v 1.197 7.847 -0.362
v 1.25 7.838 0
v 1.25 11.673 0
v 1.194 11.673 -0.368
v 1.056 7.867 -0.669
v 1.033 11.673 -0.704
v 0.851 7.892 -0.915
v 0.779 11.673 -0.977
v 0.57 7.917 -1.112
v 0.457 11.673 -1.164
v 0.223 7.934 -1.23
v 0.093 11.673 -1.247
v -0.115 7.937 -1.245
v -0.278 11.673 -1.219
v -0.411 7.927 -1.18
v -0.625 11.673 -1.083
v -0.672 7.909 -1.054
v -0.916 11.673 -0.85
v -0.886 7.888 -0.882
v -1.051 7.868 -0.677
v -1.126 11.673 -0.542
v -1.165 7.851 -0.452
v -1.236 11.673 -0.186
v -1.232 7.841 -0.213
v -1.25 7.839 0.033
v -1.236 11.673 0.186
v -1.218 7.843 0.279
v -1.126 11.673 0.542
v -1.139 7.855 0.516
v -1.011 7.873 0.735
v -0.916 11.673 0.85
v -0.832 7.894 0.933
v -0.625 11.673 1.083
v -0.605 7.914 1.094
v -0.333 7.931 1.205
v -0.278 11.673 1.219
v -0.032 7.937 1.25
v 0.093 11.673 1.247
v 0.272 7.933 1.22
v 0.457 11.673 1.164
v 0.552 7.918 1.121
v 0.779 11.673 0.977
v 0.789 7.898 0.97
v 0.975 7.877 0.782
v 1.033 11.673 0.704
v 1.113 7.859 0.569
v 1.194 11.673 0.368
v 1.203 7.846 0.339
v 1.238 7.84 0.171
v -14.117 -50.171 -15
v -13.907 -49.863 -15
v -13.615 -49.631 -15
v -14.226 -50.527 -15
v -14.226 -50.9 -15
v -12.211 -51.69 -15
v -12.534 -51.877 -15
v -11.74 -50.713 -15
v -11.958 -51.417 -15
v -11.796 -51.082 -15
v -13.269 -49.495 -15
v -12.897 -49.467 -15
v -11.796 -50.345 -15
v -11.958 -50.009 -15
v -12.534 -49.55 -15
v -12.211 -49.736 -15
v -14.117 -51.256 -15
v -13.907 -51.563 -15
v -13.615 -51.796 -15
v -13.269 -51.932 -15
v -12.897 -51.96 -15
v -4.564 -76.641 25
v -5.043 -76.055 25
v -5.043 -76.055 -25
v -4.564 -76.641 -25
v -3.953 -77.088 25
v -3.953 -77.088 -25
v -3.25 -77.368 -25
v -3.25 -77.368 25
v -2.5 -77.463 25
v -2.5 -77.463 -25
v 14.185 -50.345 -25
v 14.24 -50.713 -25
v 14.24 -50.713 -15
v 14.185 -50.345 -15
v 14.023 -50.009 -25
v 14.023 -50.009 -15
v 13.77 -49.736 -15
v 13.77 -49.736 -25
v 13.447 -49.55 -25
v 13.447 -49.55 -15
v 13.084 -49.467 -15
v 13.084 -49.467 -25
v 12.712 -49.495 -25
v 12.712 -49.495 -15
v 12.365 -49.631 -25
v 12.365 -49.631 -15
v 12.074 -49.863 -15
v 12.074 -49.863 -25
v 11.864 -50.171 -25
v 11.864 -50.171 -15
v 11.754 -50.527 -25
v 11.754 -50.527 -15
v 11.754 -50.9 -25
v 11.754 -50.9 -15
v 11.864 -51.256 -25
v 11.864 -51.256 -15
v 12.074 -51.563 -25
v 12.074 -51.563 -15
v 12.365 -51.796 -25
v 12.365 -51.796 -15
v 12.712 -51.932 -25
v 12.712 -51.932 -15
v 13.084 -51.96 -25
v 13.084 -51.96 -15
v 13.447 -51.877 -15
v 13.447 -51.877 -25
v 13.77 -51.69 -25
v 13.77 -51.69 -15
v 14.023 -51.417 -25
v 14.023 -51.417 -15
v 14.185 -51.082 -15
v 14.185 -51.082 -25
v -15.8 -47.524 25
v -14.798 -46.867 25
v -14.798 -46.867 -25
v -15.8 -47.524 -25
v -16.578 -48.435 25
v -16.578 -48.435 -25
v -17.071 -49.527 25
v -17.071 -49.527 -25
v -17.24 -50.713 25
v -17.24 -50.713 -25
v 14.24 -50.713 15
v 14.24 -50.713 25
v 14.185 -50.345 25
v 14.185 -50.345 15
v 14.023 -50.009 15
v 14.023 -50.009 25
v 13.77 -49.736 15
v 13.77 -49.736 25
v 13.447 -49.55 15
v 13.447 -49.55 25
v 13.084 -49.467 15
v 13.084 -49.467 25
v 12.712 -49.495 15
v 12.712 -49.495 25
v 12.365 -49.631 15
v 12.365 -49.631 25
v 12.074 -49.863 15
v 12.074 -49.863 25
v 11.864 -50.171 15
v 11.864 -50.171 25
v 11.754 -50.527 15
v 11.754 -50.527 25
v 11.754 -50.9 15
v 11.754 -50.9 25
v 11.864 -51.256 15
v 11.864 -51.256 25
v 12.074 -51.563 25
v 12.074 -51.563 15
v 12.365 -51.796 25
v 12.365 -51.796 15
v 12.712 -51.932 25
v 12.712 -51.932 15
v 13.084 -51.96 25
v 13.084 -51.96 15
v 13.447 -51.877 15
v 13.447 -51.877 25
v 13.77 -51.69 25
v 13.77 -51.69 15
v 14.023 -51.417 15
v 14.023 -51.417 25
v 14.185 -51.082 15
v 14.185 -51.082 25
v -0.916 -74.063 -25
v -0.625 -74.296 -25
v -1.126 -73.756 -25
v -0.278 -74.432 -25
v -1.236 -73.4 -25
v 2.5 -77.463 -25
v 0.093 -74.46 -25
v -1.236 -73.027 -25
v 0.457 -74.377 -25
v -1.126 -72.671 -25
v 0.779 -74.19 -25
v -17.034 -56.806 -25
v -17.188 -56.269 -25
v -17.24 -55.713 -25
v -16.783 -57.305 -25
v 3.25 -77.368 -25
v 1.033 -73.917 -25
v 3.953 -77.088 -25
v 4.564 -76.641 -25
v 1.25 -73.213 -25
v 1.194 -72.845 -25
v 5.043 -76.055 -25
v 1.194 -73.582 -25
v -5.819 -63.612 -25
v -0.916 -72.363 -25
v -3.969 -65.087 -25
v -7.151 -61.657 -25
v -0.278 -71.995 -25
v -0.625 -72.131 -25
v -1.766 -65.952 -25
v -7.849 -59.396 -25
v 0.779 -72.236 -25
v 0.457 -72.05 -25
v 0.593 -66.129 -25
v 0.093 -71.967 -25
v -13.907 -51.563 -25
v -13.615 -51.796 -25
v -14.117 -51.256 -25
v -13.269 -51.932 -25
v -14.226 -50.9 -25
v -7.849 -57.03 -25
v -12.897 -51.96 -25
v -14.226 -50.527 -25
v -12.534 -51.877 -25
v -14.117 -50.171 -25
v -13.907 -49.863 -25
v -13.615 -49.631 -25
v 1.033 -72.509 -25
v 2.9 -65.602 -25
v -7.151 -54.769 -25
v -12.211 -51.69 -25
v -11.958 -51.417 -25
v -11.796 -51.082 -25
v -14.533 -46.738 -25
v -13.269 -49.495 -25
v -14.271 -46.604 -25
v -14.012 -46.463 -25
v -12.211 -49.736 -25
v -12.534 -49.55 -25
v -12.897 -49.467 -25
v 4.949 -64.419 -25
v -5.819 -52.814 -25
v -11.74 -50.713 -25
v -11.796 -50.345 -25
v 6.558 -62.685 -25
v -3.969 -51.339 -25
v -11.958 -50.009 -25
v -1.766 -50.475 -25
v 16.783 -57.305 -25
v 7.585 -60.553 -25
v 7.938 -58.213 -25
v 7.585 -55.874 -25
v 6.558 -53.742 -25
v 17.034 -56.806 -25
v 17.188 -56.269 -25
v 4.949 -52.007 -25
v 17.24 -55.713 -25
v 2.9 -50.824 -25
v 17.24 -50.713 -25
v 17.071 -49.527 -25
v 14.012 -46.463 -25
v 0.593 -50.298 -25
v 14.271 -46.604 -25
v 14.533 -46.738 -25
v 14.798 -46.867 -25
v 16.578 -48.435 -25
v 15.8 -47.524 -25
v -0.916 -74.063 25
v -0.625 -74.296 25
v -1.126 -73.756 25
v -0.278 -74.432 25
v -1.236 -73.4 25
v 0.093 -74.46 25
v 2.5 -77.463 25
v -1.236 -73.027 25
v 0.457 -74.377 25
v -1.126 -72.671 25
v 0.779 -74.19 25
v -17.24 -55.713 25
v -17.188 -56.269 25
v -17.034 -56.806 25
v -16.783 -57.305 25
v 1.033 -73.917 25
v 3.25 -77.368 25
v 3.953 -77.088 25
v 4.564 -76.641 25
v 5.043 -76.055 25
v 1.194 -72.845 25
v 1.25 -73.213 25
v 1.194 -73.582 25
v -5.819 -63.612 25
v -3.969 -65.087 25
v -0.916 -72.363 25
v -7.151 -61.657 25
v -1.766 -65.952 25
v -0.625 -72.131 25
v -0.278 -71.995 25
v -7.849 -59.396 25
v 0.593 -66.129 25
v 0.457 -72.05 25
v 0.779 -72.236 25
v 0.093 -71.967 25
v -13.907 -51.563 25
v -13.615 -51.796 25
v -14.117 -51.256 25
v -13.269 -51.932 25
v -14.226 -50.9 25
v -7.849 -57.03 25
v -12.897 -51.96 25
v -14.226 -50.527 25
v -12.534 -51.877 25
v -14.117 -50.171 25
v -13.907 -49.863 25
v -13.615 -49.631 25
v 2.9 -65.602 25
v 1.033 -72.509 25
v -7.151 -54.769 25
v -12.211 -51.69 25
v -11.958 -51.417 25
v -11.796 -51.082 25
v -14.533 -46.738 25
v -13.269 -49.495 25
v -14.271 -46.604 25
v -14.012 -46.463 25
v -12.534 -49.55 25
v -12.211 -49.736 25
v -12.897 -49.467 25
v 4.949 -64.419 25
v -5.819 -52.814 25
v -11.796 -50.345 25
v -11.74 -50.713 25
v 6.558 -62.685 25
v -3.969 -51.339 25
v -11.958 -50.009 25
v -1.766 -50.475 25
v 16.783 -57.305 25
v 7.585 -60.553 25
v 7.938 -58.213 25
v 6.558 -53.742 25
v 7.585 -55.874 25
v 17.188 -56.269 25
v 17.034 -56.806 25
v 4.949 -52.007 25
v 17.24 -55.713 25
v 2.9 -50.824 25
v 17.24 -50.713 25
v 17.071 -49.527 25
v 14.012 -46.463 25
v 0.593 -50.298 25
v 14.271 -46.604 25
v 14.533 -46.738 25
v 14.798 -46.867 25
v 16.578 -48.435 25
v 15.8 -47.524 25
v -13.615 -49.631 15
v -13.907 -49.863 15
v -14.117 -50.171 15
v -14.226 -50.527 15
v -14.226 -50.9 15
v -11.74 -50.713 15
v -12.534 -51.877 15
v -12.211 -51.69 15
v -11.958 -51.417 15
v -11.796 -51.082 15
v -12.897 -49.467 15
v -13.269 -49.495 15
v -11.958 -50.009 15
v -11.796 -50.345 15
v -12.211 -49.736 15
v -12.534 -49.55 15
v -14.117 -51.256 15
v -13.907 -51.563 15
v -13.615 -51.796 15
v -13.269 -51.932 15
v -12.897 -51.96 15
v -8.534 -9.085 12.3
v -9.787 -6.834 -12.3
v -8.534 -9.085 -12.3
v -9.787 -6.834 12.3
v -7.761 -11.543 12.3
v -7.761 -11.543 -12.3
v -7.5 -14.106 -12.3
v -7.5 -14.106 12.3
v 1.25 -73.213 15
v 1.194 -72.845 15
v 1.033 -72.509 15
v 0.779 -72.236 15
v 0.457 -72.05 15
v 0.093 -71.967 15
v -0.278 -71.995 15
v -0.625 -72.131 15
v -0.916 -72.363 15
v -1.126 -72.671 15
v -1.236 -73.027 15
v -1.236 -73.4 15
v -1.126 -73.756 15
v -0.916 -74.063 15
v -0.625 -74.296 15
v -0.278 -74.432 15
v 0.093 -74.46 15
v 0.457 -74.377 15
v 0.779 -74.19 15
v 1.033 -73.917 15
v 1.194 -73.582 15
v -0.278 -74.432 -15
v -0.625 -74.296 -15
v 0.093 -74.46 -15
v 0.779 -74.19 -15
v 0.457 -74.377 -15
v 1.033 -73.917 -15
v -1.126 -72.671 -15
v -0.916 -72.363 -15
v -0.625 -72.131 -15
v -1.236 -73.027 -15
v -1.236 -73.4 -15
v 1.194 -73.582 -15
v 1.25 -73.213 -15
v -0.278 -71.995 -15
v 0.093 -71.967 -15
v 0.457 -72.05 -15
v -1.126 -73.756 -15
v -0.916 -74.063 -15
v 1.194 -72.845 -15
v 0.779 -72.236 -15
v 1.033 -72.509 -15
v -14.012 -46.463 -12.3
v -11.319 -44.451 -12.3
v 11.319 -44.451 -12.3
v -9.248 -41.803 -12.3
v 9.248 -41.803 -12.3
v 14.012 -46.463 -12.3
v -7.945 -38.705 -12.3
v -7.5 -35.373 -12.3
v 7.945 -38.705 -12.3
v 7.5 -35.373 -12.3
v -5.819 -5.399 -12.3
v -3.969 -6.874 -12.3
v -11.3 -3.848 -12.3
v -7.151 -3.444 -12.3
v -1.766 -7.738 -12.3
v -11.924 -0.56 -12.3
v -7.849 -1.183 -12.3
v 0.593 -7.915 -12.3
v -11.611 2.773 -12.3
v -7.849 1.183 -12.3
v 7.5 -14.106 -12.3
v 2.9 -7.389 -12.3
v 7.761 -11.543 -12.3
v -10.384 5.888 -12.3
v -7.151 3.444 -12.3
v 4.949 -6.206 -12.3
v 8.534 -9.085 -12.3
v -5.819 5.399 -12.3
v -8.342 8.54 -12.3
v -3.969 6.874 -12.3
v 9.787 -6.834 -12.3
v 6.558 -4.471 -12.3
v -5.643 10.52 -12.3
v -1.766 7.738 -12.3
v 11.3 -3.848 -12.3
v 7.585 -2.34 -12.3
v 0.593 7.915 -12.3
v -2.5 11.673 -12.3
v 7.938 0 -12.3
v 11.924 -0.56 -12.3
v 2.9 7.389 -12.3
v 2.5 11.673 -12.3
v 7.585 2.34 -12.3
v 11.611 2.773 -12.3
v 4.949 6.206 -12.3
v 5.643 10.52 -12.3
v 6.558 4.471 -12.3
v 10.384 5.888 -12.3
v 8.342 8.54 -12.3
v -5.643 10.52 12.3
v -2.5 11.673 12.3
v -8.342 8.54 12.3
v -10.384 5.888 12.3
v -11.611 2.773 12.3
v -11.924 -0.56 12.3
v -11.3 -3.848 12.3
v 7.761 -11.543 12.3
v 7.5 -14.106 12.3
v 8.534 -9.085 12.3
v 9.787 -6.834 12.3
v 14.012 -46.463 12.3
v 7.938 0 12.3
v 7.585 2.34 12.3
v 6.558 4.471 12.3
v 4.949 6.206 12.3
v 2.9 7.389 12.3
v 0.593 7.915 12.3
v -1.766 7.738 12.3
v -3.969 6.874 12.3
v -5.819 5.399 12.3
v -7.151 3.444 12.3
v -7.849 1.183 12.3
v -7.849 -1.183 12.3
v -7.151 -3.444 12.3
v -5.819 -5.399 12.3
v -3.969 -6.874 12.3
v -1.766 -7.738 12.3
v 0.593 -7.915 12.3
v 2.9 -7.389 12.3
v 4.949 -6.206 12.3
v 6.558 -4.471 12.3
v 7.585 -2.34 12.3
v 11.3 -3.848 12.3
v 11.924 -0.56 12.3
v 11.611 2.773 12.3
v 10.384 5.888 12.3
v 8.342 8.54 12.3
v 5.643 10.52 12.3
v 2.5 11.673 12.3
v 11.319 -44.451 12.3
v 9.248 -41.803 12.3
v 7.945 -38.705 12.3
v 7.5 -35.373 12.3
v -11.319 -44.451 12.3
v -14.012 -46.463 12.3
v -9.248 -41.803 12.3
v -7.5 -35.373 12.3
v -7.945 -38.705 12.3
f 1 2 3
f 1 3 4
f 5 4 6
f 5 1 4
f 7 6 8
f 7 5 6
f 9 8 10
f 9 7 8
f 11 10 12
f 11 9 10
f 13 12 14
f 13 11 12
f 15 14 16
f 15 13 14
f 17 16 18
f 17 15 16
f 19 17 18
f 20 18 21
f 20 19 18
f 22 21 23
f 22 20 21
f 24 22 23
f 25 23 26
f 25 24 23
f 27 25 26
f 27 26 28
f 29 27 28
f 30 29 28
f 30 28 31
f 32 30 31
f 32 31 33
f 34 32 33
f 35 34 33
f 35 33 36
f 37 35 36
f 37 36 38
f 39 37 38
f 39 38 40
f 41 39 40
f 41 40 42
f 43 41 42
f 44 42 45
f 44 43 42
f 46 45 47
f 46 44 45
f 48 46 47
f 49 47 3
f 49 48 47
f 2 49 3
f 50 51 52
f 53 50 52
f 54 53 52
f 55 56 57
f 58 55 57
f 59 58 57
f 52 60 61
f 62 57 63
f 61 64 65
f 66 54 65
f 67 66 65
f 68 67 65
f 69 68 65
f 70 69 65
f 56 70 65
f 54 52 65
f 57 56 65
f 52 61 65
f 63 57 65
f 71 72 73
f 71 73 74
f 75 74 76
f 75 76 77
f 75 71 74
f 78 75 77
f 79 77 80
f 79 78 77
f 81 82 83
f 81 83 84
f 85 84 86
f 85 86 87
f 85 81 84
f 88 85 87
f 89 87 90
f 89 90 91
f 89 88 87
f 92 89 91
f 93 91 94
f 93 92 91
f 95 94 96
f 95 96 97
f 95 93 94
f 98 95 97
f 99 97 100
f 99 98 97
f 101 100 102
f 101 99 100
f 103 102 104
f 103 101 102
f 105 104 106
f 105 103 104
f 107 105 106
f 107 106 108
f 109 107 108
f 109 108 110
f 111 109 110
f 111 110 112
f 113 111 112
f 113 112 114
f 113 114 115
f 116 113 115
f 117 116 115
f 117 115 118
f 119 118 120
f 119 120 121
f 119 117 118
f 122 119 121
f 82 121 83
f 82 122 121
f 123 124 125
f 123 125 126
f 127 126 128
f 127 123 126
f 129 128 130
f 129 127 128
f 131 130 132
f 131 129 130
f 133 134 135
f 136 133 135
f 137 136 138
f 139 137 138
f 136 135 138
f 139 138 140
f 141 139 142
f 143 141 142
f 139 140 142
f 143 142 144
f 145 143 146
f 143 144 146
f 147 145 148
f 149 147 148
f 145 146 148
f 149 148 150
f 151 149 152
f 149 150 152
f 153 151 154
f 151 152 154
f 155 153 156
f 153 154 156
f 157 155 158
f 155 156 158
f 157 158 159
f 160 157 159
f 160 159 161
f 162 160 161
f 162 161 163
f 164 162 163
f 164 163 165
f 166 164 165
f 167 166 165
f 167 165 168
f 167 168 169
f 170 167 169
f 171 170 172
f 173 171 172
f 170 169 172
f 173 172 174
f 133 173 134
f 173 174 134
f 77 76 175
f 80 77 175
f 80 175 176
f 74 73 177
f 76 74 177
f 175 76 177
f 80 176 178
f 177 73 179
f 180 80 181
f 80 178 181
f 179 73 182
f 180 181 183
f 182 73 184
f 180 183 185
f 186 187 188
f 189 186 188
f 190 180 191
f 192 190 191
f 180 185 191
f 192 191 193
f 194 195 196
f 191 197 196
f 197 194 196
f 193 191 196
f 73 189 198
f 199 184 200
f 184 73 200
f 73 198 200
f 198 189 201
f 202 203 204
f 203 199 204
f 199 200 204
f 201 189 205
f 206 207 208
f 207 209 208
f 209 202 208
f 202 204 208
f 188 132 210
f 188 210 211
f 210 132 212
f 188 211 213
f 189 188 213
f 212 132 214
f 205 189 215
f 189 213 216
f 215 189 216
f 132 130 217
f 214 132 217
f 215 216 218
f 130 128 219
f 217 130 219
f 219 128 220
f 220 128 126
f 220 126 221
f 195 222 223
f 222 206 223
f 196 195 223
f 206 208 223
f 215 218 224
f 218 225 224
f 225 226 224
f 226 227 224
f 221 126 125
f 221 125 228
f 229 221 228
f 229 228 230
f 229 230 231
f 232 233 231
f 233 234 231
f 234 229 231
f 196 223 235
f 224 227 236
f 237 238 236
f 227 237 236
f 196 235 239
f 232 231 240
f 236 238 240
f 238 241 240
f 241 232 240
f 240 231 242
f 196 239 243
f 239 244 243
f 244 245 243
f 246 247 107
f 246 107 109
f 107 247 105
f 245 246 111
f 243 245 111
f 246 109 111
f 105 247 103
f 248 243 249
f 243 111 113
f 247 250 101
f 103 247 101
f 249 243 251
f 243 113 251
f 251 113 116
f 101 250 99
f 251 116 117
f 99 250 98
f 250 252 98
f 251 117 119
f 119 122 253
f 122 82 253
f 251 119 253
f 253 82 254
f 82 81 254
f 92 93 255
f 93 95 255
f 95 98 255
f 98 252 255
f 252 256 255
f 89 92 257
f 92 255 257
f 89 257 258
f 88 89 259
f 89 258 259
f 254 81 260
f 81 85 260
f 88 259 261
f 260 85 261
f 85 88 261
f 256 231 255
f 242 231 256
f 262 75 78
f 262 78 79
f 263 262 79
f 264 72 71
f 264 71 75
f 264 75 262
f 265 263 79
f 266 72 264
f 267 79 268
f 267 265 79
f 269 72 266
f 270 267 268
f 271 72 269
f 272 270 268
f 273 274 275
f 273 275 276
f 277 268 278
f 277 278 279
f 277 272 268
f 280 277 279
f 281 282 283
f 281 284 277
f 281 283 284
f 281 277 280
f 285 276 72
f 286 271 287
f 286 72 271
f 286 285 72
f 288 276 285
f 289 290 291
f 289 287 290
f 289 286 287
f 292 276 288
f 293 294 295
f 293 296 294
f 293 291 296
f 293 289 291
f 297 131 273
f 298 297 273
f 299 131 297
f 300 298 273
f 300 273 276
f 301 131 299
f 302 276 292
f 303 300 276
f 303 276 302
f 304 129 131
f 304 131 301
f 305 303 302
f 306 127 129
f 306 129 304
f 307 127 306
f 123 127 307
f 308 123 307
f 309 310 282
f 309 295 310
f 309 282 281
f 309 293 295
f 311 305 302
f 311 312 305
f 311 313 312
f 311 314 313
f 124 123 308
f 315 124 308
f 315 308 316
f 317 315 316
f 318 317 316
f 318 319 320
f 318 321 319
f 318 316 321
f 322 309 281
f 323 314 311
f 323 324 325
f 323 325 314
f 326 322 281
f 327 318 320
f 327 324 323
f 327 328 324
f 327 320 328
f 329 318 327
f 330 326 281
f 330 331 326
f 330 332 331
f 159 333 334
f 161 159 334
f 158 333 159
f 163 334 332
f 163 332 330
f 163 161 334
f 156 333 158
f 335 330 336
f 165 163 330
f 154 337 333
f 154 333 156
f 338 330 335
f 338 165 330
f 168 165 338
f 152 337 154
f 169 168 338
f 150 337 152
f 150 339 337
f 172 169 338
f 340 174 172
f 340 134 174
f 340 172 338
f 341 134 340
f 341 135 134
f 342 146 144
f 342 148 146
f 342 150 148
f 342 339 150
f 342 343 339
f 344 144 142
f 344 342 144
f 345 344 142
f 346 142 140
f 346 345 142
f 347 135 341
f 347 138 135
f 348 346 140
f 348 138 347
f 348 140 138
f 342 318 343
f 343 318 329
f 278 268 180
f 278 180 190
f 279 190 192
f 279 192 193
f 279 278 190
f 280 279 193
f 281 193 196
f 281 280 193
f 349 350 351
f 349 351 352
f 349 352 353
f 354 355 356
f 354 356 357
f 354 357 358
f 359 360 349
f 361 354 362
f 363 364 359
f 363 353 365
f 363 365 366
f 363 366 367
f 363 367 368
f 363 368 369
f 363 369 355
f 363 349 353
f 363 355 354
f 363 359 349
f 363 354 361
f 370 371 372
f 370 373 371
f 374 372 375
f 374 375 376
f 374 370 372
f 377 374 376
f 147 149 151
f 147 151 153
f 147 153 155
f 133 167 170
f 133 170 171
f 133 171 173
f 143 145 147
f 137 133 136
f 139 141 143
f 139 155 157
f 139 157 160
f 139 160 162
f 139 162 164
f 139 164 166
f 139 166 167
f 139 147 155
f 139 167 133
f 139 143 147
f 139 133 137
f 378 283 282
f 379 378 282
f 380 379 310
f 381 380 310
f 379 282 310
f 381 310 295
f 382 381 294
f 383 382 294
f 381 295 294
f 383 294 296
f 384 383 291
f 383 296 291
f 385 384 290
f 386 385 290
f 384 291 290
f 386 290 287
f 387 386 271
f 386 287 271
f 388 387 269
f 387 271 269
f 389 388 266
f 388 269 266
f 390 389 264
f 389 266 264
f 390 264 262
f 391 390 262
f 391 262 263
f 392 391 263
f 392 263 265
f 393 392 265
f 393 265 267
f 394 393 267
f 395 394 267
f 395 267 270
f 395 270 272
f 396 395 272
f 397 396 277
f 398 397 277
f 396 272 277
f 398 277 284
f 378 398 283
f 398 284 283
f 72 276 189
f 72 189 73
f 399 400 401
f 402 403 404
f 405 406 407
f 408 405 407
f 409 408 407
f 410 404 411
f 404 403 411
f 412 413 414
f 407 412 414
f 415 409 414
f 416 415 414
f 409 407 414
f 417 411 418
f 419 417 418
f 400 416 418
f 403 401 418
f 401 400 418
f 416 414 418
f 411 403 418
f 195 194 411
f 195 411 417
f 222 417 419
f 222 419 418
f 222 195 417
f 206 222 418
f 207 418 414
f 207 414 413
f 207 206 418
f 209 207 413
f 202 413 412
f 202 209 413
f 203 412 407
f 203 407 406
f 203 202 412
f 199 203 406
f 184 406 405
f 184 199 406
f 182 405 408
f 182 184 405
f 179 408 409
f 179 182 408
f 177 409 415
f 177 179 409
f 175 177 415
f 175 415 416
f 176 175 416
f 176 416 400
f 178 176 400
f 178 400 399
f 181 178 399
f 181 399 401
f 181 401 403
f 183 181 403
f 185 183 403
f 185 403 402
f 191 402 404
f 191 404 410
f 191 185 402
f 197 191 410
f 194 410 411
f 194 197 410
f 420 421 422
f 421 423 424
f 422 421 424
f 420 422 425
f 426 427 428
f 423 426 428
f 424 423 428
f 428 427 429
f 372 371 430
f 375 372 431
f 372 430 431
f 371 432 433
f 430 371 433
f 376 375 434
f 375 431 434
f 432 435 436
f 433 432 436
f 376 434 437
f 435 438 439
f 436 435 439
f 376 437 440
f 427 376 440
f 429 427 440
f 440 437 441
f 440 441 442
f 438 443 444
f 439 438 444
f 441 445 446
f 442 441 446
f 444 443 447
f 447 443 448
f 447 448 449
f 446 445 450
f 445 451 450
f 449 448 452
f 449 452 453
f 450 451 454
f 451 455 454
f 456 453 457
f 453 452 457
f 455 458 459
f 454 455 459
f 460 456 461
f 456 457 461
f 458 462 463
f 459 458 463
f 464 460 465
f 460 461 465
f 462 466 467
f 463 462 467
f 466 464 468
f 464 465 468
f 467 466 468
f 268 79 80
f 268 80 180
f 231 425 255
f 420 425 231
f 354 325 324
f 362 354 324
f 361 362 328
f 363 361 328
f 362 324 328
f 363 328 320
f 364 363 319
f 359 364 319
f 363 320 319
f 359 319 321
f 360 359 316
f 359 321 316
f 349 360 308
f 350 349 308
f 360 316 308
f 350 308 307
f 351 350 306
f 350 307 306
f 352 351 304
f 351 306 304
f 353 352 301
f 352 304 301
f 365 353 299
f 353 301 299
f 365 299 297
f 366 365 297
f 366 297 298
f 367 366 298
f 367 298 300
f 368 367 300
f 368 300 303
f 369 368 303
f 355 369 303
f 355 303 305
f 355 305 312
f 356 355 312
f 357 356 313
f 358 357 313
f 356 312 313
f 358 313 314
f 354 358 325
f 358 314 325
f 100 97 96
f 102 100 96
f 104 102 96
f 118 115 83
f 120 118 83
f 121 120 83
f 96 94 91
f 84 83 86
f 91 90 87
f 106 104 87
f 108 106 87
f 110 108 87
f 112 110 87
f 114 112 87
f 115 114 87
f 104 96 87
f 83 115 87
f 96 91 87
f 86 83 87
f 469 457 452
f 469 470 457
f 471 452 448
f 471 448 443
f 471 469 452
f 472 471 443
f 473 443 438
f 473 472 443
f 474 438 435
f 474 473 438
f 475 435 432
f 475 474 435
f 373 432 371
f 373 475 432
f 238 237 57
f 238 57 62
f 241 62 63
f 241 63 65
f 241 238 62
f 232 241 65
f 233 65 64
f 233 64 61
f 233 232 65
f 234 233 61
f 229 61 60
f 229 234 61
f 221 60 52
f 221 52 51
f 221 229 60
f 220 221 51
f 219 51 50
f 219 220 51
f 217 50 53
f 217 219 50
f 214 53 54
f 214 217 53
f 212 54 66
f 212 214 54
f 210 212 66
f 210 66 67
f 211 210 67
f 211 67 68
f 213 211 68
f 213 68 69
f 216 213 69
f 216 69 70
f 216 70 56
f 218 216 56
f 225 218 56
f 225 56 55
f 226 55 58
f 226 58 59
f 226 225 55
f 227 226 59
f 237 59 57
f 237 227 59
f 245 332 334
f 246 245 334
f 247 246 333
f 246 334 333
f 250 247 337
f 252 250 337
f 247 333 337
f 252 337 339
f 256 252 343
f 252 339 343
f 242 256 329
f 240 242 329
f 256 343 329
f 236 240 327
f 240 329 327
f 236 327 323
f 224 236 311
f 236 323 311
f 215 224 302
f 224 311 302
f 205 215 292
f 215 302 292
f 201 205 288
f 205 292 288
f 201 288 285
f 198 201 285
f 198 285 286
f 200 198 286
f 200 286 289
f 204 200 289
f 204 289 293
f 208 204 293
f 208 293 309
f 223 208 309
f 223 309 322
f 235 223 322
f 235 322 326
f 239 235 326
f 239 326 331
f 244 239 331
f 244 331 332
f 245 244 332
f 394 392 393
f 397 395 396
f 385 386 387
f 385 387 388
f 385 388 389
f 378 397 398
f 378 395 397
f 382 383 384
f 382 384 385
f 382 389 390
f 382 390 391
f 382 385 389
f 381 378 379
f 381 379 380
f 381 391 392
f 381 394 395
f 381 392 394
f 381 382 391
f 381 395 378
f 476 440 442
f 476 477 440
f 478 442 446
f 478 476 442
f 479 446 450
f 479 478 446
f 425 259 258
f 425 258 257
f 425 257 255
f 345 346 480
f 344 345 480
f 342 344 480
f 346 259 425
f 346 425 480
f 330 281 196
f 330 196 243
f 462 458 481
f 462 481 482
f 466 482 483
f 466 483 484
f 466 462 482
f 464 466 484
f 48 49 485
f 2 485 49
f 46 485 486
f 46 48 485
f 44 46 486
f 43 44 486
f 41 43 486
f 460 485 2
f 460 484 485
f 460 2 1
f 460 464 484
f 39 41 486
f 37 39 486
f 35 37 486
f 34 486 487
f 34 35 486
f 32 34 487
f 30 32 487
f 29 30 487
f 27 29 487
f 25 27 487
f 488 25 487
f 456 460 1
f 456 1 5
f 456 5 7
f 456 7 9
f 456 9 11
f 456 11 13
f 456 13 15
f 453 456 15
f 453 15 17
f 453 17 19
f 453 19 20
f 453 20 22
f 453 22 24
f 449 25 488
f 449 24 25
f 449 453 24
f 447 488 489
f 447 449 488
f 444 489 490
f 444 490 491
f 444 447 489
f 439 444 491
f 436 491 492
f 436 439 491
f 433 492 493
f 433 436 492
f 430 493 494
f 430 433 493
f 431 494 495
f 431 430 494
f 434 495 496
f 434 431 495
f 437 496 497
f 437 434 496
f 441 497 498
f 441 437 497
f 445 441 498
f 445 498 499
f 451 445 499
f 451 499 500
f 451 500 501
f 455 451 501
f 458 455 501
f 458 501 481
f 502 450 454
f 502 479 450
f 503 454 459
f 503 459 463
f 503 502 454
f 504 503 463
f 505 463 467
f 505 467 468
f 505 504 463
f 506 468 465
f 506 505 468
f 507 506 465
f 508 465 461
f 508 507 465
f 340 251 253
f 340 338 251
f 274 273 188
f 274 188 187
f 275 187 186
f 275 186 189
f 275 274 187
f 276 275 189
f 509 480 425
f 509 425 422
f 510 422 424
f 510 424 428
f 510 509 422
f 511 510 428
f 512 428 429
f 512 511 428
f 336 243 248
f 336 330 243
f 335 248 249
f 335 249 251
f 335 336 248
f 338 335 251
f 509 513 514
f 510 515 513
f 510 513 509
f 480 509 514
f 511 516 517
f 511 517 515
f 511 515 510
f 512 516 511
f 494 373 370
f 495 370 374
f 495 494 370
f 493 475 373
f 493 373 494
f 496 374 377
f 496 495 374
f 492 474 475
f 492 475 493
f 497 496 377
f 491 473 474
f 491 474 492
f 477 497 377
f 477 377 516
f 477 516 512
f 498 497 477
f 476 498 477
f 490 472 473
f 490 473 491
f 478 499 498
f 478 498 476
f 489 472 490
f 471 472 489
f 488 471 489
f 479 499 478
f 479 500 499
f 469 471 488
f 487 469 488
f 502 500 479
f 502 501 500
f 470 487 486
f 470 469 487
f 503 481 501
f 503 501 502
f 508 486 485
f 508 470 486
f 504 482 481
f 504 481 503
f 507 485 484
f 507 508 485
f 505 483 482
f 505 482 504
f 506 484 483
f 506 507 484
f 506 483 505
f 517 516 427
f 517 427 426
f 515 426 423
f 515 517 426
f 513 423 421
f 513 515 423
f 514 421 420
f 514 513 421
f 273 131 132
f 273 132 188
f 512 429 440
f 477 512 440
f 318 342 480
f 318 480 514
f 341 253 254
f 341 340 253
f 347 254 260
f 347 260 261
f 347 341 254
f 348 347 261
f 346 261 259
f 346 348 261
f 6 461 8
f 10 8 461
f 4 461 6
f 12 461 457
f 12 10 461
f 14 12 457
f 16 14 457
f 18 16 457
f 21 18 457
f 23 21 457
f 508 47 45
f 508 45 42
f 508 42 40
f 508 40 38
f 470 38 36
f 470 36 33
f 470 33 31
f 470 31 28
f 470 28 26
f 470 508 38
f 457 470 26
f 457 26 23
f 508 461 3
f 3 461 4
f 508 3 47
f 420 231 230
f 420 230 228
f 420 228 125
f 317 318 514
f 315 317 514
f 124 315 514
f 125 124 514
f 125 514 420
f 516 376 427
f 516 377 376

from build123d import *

# Parameters (mm, degrees)
BOSS_EXTRUDE1_DEPTH = 25
SKETCH1_3_R         = 7.9375
BOSS_EXTRUDE2_DEPTH = 12.3
SKETCH3_R           = 1.25
CUT_EXTRUDE1_DEPTH  = 84.203236869
SKETCH4_R           = 1.25
CUT_EXTRUDE2_DEPTH  = 10
SKETCH5_R           = 7.9375
CUT_EXTRUDE3_DEPTH  = 94.796474483


with BuildPart() as part:
    # Sketch1 → Boss-Extrude1 (new, symmetric)
    with BuildSketch(Plane.XY):
        with BuildLine():
            Line((14.011631608, -46.463203436), (-14.011631608, -46.463203436))
            ThreePointArc((-14.011631608, -46.463203436), (-14.401354266, -46.671858143), (-14.798102621, -46.866822962))
            ThreePointArc((-14.798102621, -46.866822962), (-16.578229761, -48.435081034), (-17.240381057, -50.713203436))
            Line((-17.240381057, -50.713203436), (-17.240381057, -55.713203436))
            ThreePointArc((-17.240381057, -55.713203436), (-17.123784168, -56.541446455), (-16.783056724, -57.305309102))
            Line((-16.783056724, -57.305309102), (-5.042675667, -76.055309102))
            ThreePointArc((-5.042675667, -76.055309102), (-3.953217637, -77.087733584), (-2.5, -77.463203436))
            Line((-2.5, -77.463203436), (2.5, -77.463203436))
            ThreePointArc((2.5, -77.463203436), (3.953217637, -77.087733584), (5.042675667, -76.055309102))
            Line((5.042675667, -76.055309102), (16.783056724, -57.305309102))
            ThreePointArc((16.783056724, -57.305309102), (17.123784168, -56.541446455), (17.240381057, -55.713203436))
            Line((17.240381057, -55.713203436), (17.240381057, -50.713203436))
            ThreePointArc((17.240381057, -50.713203436), (16.578229761, -48.435081034), (14.798102621, -46.866822962))
            ThreePointArc((14.798102621, -46.866822962), (14.401354266, -46.671858143), (14.011631608, -46.463203436))
        make_face()
    extrude(amount=BOSS_EXTRUDE1_DEPTH, both=True)

    # Sketch1<3> → Boss-Extrude2 (add, symmetric)
    with BuildSketch(Plane.XY):
        with BuildLine():
            ThreePointArc((-7.5, -35.372933076), (-9.248235791, -41.803241056), (-14.011631608, -46.463203436))
            Line((-14.011631608, -46.463203436), (14.011631608, -46.463203436))
            ThreePointArc((14.011631608, -46.463203436), (9.248235791, -41.803241056), (7.5, -35.372933076))
            Line((7.5, -35.372933076), (7.5, -14.105545231))
            ThreePointArc((7.5, -14.105545231), (8.085343648, -10.294364118), (9.787417555, -6.83449807))
            ThreePointArc((9.787417555, -6.83449807), (11.107431649, 4.373656183), (2.5, 11.672784854))
            Line((2.5, 11.672784854), (-2.5, 11.672784854))
            ThreePointArc((-2.5, 11.672784854), (-11.107431649, 4.373656183), (-9.787417555, -6.83449807))
            ThreePointArc((-9.787417555, -6.83449807), (-8.085343648, -10.294364118), (-7.5, -14.105545231))
            Line((-7.5, -14.105545231), (-7.5, -35.372933076))
        make_face()
        Circle(SKETCH1_3_R, mode=Mode.SUBTRACT)
    extrude(amount=BOSS_EXTRUDE2_DEPTH, both=True)

    # Sketch3 → Cut-Extrude1 (cut, through all)
    with BuildSketch(Plane(origin=(0, 0, 0), x_dir=(1, 0, 0), z_dir=(0, 1, 0))):
        Circle(SKETCH3_R)
    extrude(amount=CUT_EXTRUDE1_DEPTH, mode=Mode.SUBTRACT)

    # Sketch4 → Cut-Extrude2 (cut)
    with BuildSketch(Plane.XY.offset(25)):
        with Locations((-12.990381057, -50.713203436)):
            Circle(SKETCH4_R)
        with Locations((12.990381057, -50.713203436)):
            Circle(SKETCH4_R)
        with Locations((0, -73.213203436)):
            Circle(SKETCH4_R)
    cut_extrude2 = extrude(amount=-CUT_EXTRUDE2_DEPTH, mode=Mode.SUBTRACT)

    # Mirror1: Cut-Extrude2 across plane
    add(cut_extrude2.mirror(Plane.XY), mode=Mode.SUBTRACT)

    # Sketch5 → Cut-Extrude3 (cut, through all)
    with BuildSketch(Plane.XY.offset(25)):
        with Locations((0, -58.213203436)):
            Circle(SKETCH5_R)
    extrude(amount=-CUT_EXTRUDE3_DEPTH, mode=Mode.SUBTRACT)


solid = part.part
